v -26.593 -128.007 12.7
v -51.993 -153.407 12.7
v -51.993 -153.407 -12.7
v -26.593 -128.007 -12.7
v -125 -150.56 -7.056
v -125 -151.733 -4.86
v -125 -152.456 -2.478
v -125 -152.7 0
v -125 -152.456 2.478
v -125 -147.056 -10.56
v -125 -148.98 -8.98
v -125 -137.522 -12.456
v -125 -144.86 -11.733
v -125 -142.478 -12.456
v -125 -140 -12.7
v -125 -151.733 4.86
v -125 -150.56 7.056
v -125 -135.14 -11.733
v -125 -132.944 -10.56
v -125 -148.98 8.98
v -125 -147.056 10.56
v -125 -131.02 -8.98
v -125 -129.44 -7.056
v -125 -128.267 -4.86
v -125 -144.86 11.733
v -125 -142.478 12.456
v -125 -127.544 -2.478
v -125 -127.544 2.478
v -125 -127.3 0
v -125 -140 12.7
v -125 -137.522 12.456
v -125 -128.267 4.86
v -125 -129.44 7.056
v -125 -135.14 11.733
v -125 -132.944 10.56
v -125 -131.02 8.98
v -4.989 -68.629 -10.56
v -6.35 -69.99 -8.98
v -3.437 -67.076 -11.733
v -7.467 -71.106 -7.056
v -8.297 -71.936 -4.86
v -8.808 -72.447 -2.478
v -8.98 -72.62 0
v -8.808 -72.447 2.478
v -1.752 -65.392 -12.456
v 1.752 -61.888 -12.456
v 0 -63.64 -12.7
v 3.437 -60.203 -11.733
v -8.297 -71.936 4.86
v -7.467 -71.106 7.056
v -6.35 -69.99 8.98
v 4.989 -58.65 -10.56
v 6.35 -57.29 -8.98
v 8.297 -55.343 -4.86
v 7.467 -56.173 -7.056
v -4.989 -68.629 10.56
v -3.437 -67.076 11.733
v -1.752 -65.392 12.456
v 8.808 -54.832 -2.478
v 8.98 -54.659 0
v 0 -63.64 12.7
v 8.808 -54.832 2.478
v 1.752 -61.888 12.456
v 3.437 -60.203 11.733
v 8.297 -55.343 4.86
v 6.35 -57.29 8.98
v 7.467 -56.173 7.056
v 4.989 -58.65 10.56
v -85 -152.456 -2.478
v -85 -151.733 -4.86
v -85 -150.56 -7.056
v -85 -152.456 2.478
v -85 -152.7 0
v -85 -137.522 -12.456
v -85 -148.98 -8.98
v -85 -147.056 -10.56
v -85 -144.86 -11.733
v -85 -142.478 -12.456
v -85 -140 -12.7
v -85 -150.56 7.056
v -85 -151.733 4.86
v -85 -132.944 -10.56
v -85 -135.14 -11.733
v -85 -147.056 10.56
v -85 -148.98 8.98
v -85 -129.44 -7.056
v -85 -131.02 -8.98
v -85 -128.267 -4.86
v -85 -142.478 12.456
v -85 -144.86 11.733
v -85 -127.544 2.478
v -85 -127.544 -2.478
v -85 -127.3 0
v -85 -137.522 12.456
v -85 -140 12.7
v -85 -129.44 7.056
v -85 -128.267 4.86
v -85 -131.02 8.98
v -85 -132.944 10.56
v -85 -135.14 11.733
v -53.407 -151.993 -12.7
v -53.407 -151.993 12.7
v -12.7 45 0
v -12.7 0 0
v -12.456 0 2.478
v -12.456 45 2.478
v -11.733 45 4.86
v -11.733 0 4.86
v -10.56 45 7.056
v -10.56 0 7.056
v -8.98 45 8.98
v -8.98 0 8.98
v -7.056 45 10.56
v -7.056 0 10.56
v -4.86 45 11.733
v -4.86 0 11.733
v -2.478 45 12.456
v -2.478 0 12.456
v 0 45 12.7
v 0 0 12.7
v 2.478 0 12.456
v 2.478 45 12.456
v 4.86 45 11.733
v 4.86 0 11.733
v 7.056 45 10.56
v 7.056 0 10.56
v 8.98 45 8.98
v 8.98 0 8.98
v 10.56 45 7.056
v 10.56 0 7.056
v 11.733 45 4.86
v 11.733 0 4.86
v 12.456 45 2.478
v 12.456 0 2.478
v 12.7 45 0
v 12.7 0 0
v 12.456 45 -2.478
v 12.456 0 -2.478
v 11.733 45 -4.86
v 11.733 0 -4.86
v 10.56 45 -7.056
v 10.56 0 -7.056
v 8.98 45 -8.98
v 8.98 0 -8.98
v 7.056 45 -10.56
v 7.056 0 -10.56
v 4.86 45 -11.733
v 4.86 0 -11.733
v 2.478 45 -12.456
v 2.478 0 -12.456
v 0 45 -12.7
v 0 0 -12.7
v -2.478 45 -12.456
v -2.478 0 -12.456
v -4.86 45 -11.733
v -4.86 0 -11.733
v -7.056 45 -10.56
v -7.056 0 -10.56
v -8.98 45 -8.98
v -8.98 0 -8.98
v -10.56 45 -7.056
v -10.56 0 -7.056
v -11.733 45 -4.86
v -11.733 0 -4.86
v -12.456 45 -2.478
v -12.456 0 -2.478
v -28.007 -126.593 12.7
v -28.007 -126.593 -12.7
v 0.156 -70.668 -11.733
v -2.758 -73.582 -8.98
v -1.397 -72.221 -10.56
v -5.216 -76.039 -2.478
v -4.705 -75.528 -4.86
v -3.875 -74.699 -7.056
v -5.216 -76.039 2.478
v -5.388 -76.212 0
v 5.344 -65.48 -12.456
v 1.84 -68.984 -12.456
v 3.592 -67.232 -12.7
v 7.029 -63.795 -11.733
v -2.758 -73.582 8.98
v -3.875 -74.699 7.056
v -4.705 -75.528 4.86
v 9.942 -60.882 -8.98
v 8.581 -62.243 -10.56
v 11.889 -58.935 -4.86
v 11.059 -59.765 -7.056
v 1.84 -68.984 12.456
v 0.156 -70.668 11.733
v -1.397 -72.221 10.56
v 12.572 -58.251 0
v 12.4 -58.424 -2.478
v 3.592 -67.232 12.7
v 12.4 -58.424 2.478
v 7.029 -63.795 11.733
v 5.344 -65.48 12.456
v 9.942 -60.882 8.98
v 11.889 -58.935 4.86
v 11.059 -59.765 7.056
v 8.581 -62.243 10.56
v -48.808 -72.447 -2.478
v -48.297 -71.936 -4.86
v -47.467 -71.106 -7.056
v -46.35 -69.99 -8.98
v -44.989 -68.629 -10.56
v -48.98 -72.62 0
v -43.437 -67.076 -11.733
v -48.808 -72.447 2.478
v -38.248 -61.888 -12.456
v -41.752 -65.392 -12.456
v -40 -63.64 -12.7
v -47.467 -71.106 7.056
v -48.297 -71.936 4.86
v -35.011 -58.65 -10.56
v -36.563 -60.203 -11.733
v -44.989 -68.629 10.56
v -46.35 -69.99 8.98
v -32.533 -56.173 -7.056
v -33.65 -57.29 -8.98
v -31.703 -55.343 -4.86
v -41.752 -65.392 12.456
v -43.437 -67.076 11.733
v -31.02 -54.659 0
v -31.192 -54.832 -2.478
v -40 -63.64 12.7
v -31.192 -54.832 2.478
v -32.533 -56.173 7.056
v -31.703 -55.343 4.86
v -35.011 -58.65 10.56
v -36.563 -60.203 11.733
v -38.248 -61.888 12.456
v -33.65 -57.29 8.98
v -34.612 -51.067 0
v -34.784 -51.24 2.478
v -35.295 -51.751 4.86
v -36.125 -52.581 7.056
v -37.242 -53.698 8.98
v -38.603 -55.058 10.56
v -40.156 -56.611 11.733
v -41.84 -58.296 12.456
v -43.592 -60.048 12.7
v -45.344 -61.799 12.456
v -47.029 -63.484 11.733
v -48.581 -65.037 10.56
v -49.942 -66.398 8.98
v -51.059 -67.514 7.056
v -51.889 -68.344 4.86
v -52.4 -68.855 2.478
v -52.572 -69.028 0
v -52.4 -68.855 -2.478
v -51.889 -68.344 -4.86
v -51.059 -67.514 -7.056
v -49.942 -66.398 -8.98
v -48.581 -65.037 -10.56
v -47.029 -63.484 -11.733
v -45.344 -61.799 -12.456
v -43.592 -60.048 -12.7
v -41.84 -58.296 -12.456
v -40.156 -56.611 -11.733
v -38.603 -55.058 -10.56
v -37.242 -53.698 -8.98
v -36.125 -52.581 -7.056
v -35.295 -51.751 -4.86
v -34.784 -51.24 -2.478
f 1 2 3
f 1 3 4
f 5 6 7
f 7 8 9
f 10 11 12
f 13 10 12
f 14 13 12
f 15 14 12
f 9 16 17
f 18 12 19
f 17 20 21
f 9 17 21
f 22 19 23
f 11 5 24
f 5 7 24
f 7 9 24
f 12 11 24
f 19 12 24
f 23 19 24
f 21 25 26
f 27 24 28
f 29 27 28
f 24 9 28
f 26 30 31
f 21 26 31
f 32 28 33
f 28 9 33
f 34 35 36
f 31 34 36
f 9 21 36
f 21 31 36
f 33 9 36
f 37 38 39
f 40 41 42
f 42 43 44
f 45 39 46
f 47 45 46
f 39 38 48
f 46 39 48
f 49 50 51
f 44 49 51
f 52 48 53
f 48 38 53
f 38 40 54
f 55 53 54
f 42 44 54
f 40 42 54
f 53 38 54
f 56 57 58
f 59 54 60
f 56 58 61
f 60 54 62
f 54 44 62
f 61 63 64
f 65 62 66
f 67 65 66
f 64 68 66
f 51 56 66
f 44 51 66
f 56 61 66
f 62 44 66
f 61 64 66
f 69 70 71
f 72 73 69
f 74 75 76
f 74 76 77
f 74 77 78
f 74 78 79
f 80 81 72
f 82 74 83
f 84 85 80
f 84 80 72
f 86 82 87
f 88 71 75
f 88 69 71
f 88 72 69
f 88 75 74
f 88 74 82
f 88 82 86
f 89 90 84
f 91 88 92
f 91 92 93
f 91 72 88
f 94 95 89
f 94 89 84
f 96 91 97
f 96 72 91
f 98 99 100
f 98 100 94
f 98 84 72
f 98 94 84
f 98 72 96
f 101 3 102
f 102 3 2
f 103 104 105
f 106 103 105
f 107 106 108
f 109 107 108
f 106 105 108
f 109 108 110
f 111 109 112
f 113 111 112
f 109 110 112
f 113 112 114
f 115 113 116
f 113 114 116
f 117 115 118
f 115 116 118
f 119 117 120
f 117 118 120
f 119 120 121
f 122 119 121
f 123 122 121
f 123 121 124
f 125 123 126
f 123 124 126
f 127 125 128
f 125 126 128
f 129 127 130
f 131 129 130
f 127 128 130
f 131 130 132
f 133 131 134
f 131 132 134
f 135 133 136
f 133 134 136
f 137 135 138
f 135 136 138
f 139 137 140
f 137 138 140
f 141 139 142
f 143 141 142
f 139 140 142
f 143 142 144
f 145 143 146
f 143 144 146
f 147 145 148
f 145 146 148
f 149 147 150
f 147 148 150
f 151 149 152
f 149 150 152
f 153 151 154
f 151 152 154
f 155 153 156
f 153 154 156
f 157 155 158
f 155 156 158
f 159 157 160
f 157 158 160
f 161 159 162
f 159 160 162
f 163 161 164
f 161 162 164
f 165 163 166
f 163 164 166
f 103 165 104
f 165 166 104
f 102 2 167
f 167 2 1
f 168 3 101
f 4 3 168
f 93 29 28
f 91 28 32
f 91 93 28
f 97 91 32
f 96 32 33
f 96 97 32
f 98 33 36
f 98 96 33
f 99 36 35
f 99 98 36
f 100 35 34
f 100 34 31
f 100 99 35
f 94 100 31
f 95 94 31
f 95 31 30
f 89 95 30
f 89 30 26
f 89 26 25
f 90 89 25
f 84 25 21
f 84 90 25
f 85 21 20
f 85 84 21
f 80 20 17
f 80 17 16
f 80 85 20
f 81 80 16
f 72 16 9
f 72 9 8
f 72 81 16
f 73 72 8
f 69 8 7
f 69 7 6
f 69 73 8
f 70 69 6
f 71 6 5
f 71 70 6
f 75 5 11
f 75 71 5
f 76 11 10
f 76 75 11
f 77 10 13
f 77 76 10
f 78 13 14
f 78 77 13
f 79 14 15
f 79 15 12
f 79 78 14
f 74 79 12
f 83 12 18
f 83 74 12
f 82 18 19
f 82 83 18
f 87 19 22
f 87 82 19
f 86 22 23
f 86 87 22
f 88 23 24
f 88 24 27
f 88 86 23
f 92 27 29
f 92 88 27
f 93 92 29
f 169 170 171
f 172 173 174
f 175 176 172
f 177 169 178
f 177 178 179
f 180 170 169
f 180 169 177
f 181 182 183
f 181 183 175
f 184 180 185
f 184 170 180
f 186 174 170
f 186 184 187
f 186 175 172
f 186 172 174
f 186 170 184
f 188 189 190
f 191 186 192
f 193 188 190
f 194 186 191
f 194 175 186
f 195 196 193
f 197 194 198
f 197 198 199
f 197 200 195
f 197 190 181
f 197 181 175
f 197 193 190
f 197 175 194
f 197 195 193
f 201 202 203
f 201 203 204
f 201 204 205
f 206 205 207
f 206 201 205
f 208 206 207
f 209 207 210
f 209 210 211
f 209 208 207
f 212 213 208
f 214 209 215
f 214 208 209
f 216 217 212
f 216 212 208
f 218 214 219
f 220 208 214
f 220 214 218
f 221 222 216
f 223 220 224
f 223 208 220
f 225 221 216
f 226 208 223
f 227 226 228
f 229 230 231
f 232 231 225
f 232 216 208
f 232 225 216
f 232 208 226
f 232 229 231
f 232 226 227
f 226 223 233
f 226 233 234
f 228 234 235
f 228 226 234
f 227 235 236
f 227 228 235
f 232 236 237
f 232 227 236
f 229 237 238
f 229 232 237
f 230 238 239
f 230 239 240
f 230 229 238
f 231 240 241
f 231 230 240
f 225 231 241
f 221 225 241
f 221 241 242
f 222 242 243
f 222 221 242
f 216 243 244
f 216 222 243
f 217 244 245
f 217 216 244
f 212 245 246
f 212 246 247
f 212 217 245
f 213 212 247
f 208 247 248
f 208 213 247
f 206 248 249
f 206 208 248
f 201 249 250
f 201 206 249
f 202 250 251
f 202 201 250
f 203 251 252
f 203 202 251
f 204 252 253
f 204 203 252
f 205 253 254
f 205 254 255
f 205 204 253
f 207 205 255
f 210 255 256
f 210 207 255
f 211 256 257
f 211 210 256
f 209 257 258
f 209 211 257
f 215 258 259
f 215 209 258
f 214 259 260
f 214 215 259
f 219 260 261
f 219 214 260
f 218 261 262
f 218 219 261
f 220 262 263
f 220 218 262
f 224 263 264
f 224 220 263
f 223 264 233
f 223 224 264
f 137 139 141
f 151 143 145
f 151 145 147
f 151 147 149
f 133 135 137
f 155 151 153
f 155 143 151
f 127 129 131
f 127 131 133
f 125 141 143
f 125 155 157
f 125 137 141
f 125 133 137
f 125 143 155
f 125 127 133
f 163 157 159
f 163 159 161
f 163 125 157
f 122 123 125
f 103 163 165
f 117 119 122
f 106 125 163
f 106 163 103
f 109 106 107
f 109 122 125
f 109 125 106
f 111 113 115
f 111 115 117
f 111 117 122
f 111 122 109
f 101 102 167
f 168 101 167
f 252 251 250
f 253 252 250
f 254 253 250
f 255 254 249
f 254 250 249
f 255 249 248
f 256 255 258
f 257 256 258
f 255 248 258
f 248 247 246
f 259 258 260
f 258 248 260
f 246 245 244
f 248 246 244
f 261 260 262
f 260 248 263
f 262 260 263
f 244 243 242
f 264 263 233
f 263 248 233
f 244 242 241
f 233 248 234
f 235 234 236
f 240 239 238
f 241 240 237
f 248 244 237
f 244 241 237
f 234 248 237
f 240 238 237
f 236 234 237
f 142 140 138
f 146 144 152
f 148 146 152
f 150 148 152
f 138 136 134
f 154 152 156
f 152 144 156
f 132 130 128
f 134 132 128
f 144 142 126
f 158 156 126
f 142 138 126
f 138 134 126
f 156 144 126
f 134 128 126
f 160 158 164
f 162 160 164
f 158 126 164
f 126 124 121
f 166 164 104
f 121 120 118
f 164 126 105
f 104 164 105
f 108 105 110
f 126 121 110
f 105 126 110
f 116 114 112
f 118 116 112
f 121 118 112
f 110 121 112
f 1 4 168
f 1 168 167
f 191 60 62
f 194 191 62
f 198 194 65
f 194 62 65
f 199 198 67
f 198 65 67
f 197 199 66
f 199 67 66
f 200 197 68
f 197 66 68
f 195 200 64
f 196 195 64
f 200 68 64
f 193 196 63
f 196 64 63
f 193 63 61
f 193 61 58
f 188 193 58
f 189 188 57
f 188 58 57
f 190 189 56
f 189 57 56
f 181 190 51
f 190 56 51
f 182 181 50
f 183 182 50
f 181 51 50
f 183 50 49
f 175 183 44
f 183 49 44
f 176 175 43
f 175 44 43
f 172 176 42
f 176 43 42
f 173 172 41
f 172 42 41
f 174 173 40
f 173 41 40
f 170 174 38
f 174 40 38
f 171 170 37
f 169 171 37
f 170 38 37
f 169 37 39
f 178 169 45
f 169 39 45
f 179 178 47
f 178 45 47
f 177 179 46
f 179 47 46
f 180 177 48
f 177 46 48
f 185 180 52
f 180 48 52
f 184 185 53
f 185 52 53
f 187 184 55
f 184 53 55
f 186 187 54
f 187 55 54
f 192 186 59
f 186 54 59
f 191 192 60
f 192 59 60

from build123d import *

# Parameters (mm, degrees)
F2_R      = 12.7
F3_DEPTH  = 5.08
F5_R      = 12.7
F6_DEPTH  = 5.08
F8_W      = 35.921025
F8_H      = 25.4
F9_DEPTH  = 1
F11_R     = 12.7
F12_DEPTH = 45
F14_R     = 12.7
F15_DEPTH = 40


with BuildPart() as f3:
    # F2 (on face) → F3 (new body)
    with BuildSketch(Plane(origin=(31.819805, -31.819805, 0), x_dir=(0.707107, 0.707107, 0), z_dir=(0.707107, -0.707107, 0))):
        with Locations((-45, 0)):
            Circle(F2_R)
    extrude(amount=F3_DEPTH)


with BuildPart() as f6:
    # F5 (on face) → F6 (new body)
    with BuildSketch(Plane(origin=(11.819805, -11.819805, 0), x_dir=(0.707107, 0.707107, 0), z_dir=(0.707107, -0.707107, 0))):
        with Locations((-73.284271, 0)):
            Circle(F5_R)
    extrude(amount=-F6_DEPTH)


with BuildPart() as f9:
    # F8 (on face) → F9 (new body, symmetric)
    with BuildSketch(Plane(origin=(50, -50, 0), x_dir=(0.707107, 0.707107, 0), z_dir=(0.707107, -0.707107, 0))):
        with Locations((-127.279221, 0)):
            Rectangle(F8_W, F8_H)
    extrude(amount=F9_DEPTH, both=True)


with BuildPart() as f12:
    # F11 (on face) → F12 (new body, through all)
    with BuildSketch(Plane(origin=(0, 0, 0), x_dir=(-1, 0, 0), z_dir=(0, 1, 0))):
        Circle(F11_R)
    extrude(amount=F12_DEPTH)


with BuildPart() as f15:
    # F14 (on face) → F15 (new body, through all)
    with BuildSketch(Plane.YZ.offset(-85)):
        with Locations((-140, 0)):
            Circle(F14_R)
    extrude(amount=-F15_DEPTH)


solid = Compound([f3.part, f6.part, f9.part, f12.part, f15.part])
